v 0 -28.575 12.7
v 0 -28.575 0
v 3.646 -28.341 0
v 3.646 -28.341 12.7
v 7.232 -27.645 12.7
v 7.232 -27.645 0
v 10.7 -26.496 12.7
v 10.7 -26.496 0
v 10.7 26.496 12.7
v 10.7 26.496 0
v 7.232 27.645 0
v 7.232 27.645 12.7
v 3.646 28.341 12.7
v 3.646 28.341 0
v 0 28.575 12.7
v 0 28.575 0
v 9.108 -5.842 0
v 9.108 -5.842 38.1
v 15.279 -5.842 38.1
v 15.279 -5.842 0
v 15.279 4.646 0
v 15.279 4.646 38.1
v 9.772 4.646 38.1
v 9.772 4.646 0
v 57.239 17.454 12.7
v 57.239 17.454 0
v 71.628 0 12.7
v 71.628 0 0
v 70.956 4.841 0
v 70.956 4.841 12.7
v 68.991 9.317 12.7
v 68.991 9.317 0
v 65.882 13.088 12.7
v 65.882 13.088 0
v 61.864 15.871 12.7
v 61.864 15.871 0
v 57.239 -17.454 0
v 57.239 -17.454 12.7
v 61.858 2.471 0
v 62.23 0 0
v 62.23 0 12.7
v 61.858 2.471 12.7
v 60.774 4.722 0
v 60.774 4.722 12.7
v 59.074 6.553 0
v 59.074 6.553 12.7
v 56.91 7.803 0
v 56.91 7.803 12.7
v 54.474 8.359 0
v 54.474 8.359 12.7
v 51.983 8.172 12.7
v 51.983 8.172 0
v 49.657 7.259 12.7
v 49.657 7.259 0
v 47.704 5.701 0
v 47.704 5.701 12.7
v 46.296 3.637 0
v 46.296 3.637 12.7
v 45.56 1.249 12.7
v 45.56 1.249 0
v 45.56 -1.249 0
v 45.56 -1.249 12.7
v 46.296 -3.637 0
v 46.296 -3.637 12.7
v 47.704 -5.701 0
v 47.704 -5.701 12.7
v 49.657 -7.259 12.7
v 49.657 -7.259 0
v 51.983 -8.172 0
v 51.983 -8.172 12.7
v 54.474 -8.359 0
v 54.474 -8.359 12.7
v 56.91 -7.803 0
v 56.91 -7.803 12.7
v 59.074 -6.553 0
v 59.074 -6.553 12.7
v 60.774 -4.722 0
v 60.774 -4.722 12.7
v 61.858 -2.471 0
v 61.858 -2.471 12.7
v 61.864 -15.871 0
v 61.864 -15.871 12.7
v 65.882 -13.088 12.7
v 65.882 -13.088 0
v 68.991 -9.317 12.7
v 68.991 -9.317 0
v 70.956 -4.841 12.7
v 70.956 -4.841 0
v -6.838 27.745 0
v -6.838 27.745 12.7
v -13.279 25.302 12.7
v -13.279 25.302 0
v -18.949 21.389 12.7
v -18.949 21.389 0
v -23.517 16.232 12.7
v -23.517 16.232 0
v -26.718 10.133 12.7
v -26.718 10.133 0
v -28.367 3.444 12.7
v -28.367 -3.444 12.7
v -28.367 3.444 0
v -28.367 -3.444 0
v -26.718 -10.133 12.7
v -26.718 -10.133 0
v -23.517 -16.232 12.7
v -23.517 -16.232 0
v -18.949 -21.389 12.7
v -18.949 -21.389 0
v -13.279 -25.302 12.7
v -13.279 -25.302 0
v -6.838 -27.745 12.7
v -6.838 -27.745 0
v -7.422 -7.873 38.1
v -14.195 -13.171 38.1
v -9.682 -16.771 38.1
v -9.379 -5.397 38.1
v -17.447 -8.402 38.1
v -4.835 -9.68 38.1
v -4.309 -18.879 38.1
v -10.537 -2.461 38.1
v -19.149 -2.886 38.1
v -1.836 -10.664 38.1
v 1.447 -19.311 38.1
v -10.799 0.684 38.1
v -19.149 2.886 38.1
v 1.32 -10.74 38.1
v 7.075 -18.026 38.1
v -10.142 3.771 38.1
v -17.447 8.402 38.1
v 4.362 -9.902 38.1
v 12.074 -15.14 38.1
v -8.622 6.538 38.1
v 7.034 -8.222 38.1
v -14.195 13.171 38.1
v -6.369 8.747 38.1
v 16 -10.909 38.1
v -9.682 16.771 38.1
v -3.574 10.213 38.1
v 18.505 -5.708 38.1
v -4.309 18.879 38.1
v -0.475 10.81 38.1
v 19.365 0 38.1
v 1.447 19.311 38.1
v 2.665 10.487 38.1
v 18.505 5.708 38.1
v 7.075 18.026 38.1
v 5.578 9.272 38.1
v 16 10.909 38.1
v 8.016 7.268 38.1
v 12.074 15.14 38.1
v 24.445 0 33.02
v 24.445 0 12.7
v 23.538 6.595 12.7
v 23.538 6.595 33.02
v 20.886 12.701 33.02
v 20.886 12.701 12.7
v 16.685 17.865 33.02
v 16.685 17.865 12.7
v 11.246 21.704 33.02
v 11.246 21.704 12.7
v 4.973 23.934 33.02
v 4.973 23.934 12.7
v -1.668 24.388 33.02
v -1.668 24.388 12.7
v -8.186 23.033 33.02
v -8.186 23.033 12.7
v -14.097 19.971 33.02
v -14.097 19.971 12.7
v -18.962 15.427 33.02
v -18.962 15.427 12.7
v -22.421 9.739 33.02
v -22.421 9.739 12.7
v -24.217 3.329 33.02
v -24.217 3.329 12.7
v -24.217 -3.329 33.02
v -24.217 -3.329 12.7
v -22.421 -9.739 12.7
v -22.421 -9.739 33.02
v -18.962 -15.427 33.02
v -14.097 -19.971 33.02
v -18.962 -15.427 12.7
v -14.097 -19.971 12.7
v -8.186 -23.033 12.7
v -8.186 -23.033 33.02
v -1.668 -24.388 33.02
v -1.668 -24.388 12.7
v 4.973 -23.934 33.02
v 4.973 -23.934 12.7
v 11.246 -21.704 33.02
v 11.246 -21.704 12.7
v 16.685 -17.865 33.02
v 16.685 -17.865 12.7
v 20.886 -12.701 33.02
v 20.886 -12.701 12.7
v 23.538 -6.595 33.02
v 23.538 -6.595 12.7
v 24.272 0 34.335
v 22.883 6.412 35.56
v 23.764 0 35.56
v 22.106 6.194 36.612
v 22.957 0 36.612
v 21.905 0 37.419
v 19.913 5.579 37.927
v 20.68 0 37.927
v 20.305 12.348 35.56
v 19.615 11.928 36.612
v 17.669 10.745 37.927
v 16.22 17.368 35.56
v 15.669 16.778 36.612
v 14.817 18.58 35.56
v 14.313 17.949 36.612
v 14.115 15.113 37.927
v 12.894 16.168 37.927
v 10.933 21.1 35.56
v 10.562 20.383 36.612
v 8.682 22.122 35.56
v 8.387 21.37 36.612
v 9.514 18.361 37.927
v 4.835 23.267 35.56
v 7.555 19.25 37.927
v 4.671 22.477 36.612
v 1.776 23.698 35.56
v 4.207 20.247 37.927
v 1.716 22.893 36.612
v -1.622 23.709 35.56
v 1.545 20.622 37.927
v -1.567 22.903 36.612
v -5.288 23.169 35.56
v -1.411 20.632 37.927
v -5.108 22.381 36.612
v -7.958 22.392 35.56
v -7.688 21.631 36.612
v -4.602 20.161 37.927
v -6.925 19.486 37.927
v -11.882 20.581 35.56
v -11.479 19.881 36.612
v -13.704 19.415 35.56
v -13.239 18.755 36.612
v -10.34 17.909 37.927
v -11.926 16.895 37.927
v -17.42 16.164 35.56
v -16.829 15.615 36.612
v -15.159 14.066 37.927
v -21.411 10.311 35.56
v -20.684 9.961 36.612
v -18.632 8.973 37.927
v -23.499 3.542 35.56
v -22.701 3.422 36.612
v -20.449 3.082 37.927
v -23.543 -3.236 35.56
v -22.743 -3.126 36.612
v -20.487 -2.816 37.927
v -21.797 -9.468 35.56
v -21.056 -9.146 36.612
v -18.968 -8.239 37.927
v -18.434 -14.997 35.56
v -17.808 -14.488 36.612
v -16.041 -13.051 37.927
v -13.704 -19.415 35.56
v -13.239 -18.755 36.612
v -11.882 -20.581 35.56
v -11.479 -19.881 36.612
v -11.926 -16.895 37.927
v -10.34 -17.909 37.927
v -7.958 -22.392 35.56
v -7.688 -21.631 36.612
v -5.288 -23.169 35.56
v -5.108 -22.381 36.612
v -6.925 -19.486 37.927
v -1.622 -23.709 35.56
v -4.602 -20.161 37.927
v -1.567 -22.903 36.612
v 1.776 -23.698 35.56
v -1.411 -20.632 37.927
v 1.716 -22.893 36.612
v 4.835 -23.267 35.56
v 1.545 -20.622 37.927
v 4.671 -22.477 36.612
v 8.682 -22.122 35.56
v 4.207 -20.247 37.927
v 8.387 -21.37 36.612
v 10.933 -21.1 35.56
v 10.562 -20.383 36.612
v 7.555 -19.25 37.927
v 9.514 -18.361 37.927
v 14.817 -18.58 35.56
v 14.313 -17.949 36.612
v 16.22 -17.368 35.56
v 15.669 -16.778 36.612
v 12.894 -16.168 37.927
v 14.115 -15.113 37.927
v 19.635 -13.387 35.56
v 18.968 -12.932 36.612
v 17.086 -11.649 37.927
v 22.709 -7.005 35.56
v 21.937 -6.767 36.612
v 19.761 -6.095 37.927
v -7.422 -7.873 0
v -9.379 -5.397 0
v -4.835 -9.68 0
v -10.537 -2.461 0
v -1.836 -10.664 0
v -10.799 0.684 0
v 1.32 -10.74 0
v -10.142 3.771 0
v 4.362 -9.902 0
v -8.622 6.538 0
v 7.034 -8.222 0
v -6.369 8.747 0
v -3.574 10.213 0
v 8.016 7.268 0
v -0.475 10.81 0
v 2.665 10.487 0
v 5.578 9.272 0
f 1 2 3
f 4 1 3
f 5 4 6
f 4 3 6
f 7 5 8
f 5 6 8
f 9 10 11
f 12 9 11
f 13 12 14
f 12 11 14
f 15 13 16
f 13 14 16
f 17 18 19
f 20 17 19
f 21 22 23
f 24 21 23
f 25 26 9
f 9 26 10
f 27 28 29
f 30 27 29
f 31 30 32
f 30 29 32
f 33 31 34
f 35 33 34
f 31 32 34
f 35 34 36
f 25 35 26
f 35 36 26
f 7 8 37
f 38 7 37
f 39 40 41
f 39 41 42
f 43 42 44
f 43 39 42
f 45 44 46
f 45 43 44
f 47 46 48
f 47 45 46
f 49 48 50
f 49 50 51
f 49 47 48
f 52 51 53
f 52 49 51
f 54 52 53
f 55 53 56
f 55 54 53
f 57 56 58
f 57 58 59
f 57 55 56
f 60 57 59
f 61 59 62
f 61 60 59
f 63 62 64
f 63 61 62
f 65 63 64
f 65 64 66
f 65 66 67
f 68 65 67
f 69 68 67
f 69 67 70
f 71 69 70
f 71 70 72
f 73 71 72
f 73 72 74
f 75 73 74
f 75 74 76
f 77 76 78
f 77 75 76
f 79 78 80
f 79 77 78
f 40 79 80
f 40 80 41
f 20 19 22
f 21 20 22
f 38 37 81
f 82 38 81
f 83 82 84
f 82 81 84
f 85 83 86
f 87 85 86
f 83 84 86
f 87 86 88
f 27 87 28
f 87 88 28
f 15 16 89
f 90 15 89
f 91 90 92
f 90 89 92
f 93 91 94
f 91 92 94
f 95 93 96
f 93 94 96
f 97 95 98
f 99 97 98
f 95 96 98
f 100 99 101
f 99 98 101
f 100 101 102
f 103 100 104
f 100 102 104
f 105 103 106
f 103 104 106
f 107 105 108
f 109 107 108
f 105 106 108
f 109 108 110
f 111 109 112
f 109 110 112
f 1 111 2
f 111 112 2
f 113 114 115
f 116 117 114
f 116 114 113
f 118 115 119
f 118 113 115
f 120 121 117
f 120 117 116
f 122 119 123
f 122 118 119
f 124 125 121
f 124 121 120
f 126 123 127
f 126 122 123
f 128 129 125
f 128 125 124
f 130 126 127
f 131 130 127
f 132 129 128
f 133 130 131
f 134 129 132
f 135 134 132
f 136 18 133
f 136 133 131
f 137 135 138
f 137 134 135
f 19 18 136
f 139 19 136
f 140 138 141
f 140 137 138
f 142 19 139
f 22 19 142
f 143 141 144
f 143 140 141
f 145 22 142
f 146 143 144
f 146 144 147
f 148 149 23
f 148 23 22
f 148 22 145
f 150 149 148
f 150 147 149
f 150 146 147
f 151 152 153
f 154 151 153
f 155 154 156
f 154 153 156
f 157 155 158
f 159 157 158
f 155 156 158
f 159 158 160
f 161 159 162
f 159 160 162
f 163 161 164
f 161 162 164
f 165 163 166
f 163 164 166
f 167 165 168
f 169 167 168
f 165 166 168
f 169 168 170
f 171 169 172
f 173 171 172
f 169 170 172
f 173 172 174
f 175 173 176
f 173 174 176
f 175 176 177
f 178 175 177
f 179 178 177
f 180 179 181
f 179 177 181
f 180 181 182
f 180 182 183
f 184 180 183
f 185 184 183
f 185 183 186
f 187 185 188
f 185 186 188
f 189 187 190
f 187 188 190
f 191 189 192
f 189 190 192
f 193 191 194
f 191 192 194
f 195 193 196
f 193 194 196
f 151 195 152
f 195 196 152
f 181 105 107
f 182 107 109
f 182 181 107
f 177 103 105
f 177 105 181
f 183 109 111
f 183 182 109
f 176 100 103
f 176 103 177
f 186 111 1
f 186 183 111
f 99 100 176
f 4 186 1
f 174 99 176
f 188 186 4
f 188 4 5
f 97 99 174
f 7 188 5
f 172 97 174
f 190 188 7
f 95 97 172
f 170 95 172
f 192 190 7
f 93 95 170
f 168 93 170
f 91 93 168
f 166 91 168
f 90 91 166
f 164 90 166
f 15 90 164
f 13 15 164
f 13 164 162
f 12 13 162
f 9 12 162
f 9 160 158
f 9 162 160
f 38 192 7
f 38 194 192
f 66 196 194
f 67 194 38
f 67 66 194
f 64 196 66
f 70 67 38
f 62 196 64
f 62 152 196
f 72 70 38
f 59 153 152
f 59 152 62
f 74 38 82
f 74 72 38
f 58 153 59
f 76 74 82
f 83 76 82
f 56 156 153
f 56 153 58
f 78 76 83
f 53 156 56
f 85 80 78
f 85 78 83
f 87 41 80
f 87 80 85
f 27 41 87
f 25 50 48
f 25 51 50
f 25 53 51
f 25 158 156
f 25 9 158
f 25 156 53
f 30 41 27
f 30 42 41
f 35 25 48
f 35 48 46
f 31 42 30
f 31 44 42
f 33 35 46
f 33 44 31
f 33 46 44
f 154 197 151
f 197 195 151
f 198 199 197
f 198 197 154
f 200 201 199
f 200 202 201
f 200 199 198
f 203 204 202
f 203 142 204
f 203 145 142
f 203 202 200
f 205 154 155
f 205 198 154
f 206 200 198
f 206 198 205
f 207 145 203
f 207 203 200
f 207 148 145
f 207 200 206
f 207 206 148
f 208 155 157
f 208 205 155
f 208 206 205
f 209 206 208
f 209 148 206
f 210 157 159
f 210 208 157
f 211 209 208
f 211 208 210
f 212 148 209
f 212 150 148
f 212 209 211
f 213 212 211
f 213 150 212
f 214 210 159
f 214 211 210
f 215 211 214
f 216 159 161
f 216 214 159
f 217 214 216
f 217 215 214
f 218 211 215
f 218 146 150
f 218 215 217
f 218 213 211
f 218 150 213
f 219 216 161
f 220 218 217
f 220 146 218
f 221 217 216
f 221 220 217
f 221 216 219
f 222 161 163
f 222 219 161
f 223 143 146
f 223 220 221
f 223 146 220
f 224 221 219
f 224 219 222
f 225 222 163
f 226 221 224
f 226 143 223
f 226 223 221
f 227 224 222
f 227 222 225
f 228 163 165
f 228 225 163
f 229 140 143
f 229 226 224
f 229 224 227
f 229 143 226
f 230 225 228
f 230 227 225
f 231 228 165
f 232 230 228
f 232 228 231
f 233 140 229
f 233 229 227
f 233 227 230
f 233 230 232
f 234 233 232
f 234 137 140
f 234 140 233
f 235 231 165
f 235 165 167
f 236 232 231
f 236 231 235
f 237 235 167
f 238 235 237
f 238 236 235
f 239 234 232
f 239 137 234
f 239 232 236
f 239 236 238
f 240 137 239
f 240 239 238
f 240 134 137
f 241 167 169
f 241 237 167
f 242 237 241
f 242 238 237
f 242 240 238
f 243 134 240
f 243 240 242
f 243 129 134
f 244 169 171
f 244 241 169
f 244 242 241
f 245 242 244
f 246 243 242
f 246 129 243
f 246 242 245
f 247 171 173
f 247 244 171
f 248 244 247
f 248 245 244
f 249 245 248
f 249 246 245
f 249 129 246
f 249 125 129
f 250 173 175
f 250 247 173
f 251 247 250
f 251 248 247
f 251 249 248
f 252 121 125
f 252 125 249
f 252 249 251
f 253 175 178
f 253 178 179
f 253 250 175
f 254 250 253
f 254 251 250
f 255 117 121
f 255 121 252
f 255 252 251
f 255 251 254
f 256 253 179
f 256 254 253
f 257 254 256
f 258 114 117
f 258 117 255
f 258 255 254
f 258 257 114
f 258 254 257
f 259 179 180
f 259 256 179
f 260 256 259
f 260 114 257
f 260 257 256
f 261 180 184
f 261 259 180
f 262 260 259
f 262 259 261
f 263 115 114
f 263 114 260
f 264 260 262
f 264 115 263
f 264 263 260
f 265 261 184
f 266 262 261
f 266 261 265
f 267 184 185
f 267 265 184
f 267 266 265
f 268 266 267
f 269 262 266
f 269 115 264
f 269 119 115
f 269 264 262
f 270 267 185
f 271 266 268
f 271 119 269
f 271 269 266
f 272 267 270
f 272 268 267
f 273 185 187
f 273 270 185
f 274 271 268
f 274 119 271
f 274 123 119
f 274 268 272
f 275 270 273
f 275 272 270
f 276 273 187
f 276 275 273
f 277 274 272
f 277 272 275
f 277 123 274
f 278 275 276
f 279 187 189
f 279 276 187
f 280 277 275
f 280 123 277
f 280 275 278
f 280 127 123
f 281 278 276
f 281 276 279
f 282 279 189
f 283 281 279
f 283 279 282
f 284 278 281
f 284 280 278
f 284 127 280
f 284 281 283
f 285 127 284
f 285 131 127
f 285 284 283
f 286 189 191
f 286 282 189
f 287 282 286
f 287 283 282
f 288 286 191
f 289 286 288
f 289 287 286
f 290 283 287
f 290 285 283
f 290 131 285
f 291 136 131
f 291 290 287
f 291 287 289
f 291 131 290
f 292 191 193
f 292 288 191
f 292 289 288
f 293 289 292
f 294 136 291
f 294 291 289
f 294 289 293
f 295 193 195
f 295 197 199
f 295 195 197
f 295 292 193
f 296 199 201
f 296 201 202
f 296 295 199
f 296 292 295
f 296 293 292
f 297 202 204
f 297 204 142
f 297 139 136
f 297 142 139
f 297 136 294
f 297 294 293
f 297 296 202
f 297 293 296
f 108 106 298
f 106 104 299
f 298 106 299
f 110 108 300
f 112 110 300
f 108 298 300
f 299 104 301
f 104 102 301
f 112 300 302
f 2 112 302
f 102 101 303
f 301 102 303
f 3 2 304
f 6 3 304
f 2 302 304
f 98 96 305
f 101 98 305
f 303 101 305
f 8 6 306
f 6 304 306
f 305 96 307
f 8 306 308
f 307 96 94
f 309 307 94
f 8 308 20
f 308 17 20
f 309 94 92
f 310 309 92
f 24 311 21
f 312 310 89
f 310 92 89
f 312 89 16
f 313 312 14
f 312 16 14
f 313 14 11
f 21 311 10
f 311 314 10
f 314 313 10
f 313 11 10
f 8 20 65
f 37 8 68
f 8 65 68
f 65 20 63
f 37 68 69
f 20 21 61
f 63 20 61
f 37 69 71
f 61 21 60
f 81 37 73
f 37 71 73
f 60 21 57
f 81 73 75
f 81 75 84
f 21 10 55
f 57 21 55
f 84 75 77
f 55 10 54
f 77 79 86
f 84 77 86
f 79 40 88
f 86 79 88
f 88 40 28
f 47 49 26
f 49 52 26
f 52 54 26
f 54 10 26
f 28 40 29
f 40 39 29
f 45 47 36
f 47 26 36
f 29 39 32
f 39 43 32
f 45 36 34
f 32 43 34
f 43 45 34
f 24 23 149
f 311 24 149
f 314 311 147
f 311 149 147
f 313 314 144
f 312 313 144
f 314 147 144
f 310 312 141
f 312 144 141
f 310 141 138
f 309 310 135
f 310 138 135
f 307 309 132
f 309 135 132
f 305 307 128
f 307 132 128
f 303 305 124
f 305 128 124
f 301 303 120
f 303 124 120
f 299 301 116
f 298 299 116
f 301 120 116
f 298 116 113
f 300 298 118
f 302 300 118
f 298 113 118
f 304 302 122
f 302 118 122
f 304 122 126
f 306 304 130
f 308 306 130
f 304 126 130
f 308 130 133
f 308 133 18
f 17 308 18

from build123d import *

# Parameters (mm, degrees)
F0_R     = 8.382
F1_DEPTH = 12.7
F2_R     = 24.4449127013
F3_DEPTH = 25.4
F4_R     = 5.08
F6_DEPTH = 38.101


with BuildPart() as f1:
    # F0 (on Top) → F1 (new body)
    with BuildSketch(Plane.XY):
        with BuildLine():
            Line((10.7001249271, 26.4959987837), (0, 28.575))
            ThreePointArc((0, 28.575), (-28.575, 0), (0, -28.575))
            Line((0, -28.575), (10.7001249271, -26.4959987837))
            ThreePointArc((10.7001249271, -26.4959987837), (23.6884644373, -15.9808409542), (28.575, 0))
            ThreePointArc((28.575, 0), (23.6884644373, 15.9808409542), (10.7001249271, 26.4959987837))
        make_face()
        with BuildLine():
            ThreePointArc((10.7001249271, 26.4959987837), (5.4501128317, 28.0504348473), (0, 28.575))
            Line((0, 28.575), (10.7001249271, 26.4959987837))
        make_face()
        with BuildLine():
            Line((10.7001249271, -26.4959987837), (0, -28.575))
            ThreePointArc((0, -28.575), (5.4501128317, -28.0504348473), (10.7001249271, -26.4959987837))
        make_face()
        with BuildLine():
            Line((57.2391813175, 17.453603905), (10.7001249271, 26.4959987837))
            ThreePointArc((10.7001249271, 26.4959987837), (23.6884644373, 15.9808409542), (28.575, 0))
            ThreePointArc((28.575, 0), (23.6884644373, -15.9808409542), (10.7001249271, -26.4959987837))
            Line((10.7001249271, -26.4959987837), (57.2391813175, -17.453603905))
            ThreePointArc((57.2391813175, -17.453603905), (36.068, 0), (57.2391813175, 17.453603905))
        make_face()
        with BuildLine():
            ThreePointArc((71.628, 0), (67.5670306477, 11.3100220198), (57.2391813175, 17.453603905))
            ThreePointArc((57.2391813175, 17.453603905), (36.068, 0), (57.2391813175, -17.453603905))
            ThreePointArc((57.2391813175, -17.453603905), (67.5670306477, -11.3100220198), (71.628, 0))
        make_face()
        with Locations((53.848, 0)):
            Circle(F0_R, mode=Mode.SUBTRACT)
    extrude(amount=F1_DEPTH)

    # F2 (on face) → F3 (join)
    with BuildSketch(Plane.XY.offset(12.7)):
        Circle(F2_R)
    extrude(amount=F3_DEPTH)

    # F4
    f4_edges = [f1.edges().sort_by_distance(p)[0] for p in [
        (-24.444913, 0, 38.1),
    ]]
    fillet(f4_edges, radius=F4_R)

    # F5 (on face) → F6 (cut, through all)
    with BuildSketch(Plane.XY.offset(38.1)):
        with BuildLine():
            ThreePointArc((9.1075219166, -5.8424050607), (10.3833403237, -3.0441576954), (10.8203813405, 0))
            ThreePointArc((10.8203813405, 0), (10.5551078143, 2.3812499619), (9.7722941793, 4.6457420103))
            ThreePointArc((9.7722941793, 4.6457420103), (10.338343211, -0.6552772156), (9.1075219166, -5.8424050607))
        make_face()
        with BuildLine():
            ThreePointArc((9.7722941793, 4.6457420103), (10.5551078143, 2.3812499619), (10.8203813405, 0))
            ThreePointArc((10.8203813405, 0), (10.3833403237, -3.0441576954), (9.1075219166, -5.8424050607))
            Line((9.1075219166, -5.8424050607), (15.2793318605, -5.8424050607))
            Line((15.2793318605, -5.8424050607), (15.2793318605, 4.6457420103))
            Line((15.2793318605, 4.6457420103), (9.7722941793, 4.6457420103))
        make_face()
        with BuildLine():
            ThreePointArc((9.1075219166, -5.8424050607), (10.338343211, -0.6552772156), (9.7722941793, 4.6457420103))
            ThreePointArc((9.7722941793, 4.6457420103), (-10.7987115527, 0.6844568316), (9.1075219166, -5.8424050607))
        make_face()
    extrude(amount=-F6_DEPTH, mode=Mode.SUBTRACT)


solid = f1.part
